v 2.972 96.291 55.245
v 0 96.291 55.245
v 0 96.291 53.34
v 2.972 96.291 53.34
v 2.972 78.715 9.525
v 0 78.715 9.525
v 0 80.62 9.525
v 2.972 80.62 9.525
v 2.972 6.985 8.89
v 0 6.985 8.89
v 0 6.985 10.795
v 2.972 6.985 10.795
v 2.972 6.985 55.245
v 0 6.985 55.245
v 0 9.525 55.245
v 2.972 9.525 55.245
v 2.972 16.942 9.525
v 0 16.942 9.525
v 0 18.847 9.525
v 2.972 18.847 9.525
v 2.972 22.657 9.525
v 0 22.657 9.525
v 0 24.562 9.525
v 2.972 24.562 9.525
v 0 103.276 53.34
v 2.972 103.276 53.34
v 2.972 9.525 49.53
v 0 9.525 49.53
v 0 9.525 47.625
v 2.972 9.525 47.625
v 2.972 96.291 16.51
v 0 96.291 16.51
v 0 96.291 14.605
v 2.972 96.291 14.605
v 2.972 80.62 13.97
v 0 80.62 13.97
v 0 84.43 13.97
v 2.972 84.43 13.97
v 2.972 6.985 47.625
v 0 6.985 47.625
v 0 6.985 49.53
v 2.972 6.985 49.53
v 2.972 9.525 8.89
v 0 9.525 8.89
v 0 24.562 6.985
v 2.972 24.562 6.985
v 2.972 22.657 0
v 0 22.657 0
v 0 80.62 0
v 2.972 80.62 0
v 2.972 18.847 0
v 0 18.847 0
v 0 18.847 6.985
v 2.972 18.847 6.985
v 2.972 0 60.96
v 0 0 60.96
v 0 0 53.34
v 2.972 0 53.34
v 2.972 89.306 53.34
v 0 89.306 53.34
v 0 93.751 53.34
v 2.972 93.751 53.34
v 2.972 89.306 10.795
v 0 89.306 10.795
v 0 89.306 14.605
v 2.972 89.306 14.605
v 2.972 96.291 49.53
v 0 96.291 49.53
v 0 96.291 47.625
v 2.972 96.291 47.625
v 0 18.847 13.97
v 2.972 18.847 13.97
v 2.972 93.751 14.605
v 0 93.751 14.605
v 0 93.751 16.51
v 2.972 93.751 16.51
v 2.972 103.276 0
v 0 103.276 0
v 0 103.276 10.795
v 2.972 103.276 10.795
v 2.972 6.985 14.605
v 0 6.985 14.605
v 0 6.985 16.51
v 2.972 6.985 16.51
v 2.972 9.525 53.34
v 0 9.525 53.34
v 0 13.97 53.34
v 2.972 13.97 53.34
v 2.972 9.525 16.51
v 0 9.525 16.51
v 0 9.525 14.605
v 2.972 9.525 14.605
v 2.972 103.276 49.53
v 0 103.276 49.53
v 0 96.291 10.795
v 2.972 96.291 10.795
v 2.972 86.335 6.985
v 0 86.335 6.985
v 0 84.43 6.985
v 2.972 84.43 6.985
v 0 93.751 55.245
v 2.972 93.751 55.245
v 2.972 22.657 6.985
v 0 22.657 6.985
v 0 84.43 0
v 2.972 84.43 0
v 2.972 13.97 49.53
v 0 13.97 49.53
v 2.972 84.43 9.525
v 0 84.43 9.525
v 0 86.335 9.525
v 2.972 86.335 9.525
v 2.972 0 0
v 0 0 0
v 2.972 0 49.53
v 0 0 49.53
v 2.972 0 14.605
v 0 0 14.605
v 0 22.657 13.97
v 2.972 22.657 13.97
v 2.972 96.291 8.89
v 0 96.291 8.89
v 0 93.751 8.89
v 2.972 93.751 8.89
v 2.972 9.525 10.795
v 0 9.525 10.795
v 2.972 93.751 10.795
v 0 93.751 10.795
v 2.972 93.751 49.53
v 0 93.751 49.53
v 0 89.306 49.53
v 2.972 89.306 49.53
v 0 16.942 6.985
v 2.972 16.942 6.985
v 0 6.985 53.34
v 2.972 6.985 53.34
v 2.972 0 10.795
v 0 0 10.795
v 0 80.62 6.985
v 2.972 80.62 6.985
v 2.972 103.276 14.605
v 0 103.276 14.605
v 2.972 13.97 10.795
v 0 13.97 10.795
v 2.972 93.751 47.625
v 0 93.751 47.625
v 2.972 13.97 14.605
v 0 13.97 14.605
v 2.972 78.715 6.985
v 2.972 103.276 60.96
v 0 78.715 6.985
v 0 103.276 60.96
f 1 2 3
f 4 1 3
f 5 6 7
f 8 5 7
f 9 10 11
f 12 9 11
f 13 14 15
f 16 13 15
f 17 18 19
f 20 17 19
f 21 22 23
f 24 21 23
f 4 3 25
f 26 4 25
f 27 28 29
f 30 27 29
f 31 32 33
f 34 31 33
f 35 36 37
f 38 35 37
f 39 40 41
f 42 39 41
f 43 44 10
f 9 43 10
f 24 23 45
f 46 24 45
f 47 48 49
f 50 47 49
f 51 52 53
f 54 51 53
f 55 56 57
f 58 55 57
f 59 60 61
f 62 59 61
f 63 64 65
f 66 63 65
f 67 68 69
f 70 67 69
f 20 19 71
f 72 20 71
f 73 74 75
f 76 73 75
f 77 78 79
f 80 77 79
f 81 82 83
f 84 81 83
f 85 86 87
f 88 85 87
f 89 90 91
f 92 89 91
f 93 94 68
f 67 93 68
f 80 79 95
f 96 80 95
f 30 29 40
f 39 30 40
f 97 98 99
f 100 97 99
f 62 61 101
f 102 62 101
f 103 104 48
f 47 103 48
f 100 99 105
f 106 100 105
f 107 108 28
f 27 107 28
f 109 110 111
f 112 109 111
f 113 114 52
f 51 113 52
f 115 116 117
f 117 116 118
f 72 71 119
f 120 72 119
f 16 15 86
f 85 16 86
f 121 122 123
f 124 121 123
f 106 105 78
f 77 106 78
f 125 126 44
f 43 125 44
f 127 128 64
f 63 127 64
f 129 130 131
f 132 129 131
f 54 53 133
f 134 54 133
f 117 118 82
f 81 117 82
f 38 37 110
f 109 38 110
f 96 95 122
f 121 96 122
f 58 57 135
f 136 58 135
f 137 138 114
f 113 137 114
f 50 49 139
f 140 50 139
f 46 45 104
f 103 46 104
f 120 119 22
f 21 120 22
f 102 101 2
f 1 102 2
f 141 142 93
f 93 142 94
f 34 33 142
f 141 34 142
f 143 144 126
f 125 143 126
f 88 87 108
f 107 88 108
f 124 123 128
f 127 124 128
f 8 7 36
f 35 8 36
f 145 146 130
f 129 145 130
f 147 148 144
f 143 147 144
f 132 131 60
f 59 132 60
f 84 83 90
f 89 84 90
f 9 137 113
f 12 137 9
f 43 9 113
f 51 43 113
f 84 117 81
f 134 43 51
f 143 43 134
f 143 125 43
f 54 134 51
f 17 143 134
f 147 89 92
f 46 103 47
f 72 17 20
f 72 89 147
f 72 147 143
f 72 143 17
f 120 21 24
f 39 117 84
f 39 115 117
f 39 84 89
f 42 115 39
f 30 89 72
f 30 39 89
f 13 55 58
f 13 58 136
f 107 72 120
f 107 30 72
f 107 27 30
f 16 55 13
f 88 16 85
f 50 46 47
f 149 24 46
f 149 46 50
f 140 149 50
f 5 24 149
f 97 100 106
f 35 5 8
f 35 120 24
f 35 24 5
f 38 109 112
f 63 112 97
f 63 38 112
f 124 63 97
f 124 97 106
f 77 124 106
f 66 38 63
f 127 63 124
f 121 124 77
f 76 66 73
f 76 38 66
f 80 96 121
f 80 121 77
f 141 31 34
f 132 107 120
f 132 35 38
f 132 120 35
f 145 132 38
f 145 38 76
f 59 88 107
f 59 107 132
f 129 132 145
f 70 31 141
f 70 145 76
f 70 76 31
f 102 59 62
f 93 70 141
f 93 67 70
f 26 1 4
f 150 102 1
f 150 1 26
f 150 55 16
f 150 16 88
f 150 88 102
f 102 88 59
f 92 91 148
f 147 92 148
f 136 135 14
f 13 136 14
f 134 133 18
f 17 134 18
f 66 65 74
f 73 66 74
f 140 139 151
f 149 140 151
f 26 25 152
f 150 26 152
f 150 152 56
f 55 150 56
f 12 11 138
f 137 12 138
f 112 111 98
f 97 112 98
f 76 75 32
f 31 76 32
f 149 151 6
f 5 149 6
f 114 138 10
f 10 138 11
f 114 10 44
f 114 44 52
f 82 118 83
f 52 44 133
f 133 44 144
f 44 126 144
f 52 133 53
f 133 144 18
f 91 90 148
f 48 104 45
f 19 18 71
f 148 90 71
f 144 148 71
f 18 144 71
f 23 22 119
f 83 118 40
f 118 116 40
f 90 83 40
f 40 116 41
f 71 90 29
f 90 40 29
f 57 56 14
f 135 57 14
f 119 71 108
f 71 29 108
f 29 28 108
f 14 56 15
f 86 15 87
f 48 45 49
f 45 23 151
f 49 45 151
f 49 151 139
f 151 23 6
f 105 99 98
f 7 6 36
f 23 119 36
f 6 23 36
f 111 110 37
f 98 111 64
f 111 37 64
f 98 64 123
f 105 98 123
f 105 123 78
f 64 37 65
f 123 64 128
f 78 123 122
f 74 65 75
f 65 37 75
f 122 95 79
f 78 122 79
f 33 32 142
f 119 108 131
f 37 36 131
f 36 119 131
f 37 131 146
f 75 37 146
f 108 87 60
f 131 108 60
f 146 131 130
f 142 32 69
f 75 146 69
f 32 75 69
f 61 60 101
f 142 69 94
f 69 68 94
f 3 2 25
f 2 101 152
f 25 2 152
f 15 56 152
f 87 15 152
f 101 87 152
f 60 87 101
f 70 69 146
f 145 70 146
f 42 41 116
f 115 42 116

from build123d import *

# Parameters (mm, degrees)
F1_DEPTH = 2.9718


with BuildPart() as f1:
    # F0 (on Right) → F1 (new body)
    with BuildSketch(Plane.YZ):
        Polygon((0, 10.795), (0, 0), (18.8468, 0), (18.8468, 6.985), (16.9418, 6.985), (16.9418, 9.525), (18.8468, 9.525), (18.8468, 13.97), (22.6568, 13.97), (22.6568, 9.525), (24.5618, 9.525), (24.5618, 6.985), (22.6568, 6.985), (22.6568, 0), (80.6196, 0), (80.6196, 6.985), (78.7146, 6.985), (78.7146, 9.525), (80.6196, 9.525), (80.6196, 13.97), (84.4296, 13.97), (84.4296, 9.525), (86.3346, 9.525), (86.3346, 6.985), (84.4296, 6.985), (84.4296, 0), (103.2764, 0), (103.2764, 10.795), (96.2914, 10.795), (96.2914, 8.89), (93.7514, 8.89), (93.7514, 10.795), (89.3064, 10.795), (89.3064, 14.605), (93.7514, 14.605), (93.7514, 16.51), (96.2914, 16.51), (96.2914, 14.605), (103.2764, 14.605), (103.2764, 49.53), (96.2914, 49.53), (96.2914, 47.625), (93.7514, 47.625), (93.7514, 49.53), (89.3064, 49.53), (89.3064, 53.34), (93.7514, 53.34), (93.7514, 55.245), (96.2914, 55.245), (96.2914, 53.34), (103.2764, 53.34), (103.2764, 60.96), (0, 60.96), (0, 53.34), (6.985, 53.34), (6.985, 55.245), (9.525, 55.245), (9.525, 53.34), (13.97, 53.34), (13.97, 49.53), (9.525, 49.53), (9.525, 47.625), (6.985, 47.625), (6.985, 49.53), (0, 49.53), (0, 14.605), (6.985, 14.605), (6.985, 16.51), (9.525, 16.51), (9.525, 14.605), (13.97, 14.605), (13.97, 10.795), (9.525, 10.795), (9.525, 8.89), (6.985, 8.89), (6.985, 10.795), align=None)
    extrude(amount=F1_DEPTH)


solid = f1.part
